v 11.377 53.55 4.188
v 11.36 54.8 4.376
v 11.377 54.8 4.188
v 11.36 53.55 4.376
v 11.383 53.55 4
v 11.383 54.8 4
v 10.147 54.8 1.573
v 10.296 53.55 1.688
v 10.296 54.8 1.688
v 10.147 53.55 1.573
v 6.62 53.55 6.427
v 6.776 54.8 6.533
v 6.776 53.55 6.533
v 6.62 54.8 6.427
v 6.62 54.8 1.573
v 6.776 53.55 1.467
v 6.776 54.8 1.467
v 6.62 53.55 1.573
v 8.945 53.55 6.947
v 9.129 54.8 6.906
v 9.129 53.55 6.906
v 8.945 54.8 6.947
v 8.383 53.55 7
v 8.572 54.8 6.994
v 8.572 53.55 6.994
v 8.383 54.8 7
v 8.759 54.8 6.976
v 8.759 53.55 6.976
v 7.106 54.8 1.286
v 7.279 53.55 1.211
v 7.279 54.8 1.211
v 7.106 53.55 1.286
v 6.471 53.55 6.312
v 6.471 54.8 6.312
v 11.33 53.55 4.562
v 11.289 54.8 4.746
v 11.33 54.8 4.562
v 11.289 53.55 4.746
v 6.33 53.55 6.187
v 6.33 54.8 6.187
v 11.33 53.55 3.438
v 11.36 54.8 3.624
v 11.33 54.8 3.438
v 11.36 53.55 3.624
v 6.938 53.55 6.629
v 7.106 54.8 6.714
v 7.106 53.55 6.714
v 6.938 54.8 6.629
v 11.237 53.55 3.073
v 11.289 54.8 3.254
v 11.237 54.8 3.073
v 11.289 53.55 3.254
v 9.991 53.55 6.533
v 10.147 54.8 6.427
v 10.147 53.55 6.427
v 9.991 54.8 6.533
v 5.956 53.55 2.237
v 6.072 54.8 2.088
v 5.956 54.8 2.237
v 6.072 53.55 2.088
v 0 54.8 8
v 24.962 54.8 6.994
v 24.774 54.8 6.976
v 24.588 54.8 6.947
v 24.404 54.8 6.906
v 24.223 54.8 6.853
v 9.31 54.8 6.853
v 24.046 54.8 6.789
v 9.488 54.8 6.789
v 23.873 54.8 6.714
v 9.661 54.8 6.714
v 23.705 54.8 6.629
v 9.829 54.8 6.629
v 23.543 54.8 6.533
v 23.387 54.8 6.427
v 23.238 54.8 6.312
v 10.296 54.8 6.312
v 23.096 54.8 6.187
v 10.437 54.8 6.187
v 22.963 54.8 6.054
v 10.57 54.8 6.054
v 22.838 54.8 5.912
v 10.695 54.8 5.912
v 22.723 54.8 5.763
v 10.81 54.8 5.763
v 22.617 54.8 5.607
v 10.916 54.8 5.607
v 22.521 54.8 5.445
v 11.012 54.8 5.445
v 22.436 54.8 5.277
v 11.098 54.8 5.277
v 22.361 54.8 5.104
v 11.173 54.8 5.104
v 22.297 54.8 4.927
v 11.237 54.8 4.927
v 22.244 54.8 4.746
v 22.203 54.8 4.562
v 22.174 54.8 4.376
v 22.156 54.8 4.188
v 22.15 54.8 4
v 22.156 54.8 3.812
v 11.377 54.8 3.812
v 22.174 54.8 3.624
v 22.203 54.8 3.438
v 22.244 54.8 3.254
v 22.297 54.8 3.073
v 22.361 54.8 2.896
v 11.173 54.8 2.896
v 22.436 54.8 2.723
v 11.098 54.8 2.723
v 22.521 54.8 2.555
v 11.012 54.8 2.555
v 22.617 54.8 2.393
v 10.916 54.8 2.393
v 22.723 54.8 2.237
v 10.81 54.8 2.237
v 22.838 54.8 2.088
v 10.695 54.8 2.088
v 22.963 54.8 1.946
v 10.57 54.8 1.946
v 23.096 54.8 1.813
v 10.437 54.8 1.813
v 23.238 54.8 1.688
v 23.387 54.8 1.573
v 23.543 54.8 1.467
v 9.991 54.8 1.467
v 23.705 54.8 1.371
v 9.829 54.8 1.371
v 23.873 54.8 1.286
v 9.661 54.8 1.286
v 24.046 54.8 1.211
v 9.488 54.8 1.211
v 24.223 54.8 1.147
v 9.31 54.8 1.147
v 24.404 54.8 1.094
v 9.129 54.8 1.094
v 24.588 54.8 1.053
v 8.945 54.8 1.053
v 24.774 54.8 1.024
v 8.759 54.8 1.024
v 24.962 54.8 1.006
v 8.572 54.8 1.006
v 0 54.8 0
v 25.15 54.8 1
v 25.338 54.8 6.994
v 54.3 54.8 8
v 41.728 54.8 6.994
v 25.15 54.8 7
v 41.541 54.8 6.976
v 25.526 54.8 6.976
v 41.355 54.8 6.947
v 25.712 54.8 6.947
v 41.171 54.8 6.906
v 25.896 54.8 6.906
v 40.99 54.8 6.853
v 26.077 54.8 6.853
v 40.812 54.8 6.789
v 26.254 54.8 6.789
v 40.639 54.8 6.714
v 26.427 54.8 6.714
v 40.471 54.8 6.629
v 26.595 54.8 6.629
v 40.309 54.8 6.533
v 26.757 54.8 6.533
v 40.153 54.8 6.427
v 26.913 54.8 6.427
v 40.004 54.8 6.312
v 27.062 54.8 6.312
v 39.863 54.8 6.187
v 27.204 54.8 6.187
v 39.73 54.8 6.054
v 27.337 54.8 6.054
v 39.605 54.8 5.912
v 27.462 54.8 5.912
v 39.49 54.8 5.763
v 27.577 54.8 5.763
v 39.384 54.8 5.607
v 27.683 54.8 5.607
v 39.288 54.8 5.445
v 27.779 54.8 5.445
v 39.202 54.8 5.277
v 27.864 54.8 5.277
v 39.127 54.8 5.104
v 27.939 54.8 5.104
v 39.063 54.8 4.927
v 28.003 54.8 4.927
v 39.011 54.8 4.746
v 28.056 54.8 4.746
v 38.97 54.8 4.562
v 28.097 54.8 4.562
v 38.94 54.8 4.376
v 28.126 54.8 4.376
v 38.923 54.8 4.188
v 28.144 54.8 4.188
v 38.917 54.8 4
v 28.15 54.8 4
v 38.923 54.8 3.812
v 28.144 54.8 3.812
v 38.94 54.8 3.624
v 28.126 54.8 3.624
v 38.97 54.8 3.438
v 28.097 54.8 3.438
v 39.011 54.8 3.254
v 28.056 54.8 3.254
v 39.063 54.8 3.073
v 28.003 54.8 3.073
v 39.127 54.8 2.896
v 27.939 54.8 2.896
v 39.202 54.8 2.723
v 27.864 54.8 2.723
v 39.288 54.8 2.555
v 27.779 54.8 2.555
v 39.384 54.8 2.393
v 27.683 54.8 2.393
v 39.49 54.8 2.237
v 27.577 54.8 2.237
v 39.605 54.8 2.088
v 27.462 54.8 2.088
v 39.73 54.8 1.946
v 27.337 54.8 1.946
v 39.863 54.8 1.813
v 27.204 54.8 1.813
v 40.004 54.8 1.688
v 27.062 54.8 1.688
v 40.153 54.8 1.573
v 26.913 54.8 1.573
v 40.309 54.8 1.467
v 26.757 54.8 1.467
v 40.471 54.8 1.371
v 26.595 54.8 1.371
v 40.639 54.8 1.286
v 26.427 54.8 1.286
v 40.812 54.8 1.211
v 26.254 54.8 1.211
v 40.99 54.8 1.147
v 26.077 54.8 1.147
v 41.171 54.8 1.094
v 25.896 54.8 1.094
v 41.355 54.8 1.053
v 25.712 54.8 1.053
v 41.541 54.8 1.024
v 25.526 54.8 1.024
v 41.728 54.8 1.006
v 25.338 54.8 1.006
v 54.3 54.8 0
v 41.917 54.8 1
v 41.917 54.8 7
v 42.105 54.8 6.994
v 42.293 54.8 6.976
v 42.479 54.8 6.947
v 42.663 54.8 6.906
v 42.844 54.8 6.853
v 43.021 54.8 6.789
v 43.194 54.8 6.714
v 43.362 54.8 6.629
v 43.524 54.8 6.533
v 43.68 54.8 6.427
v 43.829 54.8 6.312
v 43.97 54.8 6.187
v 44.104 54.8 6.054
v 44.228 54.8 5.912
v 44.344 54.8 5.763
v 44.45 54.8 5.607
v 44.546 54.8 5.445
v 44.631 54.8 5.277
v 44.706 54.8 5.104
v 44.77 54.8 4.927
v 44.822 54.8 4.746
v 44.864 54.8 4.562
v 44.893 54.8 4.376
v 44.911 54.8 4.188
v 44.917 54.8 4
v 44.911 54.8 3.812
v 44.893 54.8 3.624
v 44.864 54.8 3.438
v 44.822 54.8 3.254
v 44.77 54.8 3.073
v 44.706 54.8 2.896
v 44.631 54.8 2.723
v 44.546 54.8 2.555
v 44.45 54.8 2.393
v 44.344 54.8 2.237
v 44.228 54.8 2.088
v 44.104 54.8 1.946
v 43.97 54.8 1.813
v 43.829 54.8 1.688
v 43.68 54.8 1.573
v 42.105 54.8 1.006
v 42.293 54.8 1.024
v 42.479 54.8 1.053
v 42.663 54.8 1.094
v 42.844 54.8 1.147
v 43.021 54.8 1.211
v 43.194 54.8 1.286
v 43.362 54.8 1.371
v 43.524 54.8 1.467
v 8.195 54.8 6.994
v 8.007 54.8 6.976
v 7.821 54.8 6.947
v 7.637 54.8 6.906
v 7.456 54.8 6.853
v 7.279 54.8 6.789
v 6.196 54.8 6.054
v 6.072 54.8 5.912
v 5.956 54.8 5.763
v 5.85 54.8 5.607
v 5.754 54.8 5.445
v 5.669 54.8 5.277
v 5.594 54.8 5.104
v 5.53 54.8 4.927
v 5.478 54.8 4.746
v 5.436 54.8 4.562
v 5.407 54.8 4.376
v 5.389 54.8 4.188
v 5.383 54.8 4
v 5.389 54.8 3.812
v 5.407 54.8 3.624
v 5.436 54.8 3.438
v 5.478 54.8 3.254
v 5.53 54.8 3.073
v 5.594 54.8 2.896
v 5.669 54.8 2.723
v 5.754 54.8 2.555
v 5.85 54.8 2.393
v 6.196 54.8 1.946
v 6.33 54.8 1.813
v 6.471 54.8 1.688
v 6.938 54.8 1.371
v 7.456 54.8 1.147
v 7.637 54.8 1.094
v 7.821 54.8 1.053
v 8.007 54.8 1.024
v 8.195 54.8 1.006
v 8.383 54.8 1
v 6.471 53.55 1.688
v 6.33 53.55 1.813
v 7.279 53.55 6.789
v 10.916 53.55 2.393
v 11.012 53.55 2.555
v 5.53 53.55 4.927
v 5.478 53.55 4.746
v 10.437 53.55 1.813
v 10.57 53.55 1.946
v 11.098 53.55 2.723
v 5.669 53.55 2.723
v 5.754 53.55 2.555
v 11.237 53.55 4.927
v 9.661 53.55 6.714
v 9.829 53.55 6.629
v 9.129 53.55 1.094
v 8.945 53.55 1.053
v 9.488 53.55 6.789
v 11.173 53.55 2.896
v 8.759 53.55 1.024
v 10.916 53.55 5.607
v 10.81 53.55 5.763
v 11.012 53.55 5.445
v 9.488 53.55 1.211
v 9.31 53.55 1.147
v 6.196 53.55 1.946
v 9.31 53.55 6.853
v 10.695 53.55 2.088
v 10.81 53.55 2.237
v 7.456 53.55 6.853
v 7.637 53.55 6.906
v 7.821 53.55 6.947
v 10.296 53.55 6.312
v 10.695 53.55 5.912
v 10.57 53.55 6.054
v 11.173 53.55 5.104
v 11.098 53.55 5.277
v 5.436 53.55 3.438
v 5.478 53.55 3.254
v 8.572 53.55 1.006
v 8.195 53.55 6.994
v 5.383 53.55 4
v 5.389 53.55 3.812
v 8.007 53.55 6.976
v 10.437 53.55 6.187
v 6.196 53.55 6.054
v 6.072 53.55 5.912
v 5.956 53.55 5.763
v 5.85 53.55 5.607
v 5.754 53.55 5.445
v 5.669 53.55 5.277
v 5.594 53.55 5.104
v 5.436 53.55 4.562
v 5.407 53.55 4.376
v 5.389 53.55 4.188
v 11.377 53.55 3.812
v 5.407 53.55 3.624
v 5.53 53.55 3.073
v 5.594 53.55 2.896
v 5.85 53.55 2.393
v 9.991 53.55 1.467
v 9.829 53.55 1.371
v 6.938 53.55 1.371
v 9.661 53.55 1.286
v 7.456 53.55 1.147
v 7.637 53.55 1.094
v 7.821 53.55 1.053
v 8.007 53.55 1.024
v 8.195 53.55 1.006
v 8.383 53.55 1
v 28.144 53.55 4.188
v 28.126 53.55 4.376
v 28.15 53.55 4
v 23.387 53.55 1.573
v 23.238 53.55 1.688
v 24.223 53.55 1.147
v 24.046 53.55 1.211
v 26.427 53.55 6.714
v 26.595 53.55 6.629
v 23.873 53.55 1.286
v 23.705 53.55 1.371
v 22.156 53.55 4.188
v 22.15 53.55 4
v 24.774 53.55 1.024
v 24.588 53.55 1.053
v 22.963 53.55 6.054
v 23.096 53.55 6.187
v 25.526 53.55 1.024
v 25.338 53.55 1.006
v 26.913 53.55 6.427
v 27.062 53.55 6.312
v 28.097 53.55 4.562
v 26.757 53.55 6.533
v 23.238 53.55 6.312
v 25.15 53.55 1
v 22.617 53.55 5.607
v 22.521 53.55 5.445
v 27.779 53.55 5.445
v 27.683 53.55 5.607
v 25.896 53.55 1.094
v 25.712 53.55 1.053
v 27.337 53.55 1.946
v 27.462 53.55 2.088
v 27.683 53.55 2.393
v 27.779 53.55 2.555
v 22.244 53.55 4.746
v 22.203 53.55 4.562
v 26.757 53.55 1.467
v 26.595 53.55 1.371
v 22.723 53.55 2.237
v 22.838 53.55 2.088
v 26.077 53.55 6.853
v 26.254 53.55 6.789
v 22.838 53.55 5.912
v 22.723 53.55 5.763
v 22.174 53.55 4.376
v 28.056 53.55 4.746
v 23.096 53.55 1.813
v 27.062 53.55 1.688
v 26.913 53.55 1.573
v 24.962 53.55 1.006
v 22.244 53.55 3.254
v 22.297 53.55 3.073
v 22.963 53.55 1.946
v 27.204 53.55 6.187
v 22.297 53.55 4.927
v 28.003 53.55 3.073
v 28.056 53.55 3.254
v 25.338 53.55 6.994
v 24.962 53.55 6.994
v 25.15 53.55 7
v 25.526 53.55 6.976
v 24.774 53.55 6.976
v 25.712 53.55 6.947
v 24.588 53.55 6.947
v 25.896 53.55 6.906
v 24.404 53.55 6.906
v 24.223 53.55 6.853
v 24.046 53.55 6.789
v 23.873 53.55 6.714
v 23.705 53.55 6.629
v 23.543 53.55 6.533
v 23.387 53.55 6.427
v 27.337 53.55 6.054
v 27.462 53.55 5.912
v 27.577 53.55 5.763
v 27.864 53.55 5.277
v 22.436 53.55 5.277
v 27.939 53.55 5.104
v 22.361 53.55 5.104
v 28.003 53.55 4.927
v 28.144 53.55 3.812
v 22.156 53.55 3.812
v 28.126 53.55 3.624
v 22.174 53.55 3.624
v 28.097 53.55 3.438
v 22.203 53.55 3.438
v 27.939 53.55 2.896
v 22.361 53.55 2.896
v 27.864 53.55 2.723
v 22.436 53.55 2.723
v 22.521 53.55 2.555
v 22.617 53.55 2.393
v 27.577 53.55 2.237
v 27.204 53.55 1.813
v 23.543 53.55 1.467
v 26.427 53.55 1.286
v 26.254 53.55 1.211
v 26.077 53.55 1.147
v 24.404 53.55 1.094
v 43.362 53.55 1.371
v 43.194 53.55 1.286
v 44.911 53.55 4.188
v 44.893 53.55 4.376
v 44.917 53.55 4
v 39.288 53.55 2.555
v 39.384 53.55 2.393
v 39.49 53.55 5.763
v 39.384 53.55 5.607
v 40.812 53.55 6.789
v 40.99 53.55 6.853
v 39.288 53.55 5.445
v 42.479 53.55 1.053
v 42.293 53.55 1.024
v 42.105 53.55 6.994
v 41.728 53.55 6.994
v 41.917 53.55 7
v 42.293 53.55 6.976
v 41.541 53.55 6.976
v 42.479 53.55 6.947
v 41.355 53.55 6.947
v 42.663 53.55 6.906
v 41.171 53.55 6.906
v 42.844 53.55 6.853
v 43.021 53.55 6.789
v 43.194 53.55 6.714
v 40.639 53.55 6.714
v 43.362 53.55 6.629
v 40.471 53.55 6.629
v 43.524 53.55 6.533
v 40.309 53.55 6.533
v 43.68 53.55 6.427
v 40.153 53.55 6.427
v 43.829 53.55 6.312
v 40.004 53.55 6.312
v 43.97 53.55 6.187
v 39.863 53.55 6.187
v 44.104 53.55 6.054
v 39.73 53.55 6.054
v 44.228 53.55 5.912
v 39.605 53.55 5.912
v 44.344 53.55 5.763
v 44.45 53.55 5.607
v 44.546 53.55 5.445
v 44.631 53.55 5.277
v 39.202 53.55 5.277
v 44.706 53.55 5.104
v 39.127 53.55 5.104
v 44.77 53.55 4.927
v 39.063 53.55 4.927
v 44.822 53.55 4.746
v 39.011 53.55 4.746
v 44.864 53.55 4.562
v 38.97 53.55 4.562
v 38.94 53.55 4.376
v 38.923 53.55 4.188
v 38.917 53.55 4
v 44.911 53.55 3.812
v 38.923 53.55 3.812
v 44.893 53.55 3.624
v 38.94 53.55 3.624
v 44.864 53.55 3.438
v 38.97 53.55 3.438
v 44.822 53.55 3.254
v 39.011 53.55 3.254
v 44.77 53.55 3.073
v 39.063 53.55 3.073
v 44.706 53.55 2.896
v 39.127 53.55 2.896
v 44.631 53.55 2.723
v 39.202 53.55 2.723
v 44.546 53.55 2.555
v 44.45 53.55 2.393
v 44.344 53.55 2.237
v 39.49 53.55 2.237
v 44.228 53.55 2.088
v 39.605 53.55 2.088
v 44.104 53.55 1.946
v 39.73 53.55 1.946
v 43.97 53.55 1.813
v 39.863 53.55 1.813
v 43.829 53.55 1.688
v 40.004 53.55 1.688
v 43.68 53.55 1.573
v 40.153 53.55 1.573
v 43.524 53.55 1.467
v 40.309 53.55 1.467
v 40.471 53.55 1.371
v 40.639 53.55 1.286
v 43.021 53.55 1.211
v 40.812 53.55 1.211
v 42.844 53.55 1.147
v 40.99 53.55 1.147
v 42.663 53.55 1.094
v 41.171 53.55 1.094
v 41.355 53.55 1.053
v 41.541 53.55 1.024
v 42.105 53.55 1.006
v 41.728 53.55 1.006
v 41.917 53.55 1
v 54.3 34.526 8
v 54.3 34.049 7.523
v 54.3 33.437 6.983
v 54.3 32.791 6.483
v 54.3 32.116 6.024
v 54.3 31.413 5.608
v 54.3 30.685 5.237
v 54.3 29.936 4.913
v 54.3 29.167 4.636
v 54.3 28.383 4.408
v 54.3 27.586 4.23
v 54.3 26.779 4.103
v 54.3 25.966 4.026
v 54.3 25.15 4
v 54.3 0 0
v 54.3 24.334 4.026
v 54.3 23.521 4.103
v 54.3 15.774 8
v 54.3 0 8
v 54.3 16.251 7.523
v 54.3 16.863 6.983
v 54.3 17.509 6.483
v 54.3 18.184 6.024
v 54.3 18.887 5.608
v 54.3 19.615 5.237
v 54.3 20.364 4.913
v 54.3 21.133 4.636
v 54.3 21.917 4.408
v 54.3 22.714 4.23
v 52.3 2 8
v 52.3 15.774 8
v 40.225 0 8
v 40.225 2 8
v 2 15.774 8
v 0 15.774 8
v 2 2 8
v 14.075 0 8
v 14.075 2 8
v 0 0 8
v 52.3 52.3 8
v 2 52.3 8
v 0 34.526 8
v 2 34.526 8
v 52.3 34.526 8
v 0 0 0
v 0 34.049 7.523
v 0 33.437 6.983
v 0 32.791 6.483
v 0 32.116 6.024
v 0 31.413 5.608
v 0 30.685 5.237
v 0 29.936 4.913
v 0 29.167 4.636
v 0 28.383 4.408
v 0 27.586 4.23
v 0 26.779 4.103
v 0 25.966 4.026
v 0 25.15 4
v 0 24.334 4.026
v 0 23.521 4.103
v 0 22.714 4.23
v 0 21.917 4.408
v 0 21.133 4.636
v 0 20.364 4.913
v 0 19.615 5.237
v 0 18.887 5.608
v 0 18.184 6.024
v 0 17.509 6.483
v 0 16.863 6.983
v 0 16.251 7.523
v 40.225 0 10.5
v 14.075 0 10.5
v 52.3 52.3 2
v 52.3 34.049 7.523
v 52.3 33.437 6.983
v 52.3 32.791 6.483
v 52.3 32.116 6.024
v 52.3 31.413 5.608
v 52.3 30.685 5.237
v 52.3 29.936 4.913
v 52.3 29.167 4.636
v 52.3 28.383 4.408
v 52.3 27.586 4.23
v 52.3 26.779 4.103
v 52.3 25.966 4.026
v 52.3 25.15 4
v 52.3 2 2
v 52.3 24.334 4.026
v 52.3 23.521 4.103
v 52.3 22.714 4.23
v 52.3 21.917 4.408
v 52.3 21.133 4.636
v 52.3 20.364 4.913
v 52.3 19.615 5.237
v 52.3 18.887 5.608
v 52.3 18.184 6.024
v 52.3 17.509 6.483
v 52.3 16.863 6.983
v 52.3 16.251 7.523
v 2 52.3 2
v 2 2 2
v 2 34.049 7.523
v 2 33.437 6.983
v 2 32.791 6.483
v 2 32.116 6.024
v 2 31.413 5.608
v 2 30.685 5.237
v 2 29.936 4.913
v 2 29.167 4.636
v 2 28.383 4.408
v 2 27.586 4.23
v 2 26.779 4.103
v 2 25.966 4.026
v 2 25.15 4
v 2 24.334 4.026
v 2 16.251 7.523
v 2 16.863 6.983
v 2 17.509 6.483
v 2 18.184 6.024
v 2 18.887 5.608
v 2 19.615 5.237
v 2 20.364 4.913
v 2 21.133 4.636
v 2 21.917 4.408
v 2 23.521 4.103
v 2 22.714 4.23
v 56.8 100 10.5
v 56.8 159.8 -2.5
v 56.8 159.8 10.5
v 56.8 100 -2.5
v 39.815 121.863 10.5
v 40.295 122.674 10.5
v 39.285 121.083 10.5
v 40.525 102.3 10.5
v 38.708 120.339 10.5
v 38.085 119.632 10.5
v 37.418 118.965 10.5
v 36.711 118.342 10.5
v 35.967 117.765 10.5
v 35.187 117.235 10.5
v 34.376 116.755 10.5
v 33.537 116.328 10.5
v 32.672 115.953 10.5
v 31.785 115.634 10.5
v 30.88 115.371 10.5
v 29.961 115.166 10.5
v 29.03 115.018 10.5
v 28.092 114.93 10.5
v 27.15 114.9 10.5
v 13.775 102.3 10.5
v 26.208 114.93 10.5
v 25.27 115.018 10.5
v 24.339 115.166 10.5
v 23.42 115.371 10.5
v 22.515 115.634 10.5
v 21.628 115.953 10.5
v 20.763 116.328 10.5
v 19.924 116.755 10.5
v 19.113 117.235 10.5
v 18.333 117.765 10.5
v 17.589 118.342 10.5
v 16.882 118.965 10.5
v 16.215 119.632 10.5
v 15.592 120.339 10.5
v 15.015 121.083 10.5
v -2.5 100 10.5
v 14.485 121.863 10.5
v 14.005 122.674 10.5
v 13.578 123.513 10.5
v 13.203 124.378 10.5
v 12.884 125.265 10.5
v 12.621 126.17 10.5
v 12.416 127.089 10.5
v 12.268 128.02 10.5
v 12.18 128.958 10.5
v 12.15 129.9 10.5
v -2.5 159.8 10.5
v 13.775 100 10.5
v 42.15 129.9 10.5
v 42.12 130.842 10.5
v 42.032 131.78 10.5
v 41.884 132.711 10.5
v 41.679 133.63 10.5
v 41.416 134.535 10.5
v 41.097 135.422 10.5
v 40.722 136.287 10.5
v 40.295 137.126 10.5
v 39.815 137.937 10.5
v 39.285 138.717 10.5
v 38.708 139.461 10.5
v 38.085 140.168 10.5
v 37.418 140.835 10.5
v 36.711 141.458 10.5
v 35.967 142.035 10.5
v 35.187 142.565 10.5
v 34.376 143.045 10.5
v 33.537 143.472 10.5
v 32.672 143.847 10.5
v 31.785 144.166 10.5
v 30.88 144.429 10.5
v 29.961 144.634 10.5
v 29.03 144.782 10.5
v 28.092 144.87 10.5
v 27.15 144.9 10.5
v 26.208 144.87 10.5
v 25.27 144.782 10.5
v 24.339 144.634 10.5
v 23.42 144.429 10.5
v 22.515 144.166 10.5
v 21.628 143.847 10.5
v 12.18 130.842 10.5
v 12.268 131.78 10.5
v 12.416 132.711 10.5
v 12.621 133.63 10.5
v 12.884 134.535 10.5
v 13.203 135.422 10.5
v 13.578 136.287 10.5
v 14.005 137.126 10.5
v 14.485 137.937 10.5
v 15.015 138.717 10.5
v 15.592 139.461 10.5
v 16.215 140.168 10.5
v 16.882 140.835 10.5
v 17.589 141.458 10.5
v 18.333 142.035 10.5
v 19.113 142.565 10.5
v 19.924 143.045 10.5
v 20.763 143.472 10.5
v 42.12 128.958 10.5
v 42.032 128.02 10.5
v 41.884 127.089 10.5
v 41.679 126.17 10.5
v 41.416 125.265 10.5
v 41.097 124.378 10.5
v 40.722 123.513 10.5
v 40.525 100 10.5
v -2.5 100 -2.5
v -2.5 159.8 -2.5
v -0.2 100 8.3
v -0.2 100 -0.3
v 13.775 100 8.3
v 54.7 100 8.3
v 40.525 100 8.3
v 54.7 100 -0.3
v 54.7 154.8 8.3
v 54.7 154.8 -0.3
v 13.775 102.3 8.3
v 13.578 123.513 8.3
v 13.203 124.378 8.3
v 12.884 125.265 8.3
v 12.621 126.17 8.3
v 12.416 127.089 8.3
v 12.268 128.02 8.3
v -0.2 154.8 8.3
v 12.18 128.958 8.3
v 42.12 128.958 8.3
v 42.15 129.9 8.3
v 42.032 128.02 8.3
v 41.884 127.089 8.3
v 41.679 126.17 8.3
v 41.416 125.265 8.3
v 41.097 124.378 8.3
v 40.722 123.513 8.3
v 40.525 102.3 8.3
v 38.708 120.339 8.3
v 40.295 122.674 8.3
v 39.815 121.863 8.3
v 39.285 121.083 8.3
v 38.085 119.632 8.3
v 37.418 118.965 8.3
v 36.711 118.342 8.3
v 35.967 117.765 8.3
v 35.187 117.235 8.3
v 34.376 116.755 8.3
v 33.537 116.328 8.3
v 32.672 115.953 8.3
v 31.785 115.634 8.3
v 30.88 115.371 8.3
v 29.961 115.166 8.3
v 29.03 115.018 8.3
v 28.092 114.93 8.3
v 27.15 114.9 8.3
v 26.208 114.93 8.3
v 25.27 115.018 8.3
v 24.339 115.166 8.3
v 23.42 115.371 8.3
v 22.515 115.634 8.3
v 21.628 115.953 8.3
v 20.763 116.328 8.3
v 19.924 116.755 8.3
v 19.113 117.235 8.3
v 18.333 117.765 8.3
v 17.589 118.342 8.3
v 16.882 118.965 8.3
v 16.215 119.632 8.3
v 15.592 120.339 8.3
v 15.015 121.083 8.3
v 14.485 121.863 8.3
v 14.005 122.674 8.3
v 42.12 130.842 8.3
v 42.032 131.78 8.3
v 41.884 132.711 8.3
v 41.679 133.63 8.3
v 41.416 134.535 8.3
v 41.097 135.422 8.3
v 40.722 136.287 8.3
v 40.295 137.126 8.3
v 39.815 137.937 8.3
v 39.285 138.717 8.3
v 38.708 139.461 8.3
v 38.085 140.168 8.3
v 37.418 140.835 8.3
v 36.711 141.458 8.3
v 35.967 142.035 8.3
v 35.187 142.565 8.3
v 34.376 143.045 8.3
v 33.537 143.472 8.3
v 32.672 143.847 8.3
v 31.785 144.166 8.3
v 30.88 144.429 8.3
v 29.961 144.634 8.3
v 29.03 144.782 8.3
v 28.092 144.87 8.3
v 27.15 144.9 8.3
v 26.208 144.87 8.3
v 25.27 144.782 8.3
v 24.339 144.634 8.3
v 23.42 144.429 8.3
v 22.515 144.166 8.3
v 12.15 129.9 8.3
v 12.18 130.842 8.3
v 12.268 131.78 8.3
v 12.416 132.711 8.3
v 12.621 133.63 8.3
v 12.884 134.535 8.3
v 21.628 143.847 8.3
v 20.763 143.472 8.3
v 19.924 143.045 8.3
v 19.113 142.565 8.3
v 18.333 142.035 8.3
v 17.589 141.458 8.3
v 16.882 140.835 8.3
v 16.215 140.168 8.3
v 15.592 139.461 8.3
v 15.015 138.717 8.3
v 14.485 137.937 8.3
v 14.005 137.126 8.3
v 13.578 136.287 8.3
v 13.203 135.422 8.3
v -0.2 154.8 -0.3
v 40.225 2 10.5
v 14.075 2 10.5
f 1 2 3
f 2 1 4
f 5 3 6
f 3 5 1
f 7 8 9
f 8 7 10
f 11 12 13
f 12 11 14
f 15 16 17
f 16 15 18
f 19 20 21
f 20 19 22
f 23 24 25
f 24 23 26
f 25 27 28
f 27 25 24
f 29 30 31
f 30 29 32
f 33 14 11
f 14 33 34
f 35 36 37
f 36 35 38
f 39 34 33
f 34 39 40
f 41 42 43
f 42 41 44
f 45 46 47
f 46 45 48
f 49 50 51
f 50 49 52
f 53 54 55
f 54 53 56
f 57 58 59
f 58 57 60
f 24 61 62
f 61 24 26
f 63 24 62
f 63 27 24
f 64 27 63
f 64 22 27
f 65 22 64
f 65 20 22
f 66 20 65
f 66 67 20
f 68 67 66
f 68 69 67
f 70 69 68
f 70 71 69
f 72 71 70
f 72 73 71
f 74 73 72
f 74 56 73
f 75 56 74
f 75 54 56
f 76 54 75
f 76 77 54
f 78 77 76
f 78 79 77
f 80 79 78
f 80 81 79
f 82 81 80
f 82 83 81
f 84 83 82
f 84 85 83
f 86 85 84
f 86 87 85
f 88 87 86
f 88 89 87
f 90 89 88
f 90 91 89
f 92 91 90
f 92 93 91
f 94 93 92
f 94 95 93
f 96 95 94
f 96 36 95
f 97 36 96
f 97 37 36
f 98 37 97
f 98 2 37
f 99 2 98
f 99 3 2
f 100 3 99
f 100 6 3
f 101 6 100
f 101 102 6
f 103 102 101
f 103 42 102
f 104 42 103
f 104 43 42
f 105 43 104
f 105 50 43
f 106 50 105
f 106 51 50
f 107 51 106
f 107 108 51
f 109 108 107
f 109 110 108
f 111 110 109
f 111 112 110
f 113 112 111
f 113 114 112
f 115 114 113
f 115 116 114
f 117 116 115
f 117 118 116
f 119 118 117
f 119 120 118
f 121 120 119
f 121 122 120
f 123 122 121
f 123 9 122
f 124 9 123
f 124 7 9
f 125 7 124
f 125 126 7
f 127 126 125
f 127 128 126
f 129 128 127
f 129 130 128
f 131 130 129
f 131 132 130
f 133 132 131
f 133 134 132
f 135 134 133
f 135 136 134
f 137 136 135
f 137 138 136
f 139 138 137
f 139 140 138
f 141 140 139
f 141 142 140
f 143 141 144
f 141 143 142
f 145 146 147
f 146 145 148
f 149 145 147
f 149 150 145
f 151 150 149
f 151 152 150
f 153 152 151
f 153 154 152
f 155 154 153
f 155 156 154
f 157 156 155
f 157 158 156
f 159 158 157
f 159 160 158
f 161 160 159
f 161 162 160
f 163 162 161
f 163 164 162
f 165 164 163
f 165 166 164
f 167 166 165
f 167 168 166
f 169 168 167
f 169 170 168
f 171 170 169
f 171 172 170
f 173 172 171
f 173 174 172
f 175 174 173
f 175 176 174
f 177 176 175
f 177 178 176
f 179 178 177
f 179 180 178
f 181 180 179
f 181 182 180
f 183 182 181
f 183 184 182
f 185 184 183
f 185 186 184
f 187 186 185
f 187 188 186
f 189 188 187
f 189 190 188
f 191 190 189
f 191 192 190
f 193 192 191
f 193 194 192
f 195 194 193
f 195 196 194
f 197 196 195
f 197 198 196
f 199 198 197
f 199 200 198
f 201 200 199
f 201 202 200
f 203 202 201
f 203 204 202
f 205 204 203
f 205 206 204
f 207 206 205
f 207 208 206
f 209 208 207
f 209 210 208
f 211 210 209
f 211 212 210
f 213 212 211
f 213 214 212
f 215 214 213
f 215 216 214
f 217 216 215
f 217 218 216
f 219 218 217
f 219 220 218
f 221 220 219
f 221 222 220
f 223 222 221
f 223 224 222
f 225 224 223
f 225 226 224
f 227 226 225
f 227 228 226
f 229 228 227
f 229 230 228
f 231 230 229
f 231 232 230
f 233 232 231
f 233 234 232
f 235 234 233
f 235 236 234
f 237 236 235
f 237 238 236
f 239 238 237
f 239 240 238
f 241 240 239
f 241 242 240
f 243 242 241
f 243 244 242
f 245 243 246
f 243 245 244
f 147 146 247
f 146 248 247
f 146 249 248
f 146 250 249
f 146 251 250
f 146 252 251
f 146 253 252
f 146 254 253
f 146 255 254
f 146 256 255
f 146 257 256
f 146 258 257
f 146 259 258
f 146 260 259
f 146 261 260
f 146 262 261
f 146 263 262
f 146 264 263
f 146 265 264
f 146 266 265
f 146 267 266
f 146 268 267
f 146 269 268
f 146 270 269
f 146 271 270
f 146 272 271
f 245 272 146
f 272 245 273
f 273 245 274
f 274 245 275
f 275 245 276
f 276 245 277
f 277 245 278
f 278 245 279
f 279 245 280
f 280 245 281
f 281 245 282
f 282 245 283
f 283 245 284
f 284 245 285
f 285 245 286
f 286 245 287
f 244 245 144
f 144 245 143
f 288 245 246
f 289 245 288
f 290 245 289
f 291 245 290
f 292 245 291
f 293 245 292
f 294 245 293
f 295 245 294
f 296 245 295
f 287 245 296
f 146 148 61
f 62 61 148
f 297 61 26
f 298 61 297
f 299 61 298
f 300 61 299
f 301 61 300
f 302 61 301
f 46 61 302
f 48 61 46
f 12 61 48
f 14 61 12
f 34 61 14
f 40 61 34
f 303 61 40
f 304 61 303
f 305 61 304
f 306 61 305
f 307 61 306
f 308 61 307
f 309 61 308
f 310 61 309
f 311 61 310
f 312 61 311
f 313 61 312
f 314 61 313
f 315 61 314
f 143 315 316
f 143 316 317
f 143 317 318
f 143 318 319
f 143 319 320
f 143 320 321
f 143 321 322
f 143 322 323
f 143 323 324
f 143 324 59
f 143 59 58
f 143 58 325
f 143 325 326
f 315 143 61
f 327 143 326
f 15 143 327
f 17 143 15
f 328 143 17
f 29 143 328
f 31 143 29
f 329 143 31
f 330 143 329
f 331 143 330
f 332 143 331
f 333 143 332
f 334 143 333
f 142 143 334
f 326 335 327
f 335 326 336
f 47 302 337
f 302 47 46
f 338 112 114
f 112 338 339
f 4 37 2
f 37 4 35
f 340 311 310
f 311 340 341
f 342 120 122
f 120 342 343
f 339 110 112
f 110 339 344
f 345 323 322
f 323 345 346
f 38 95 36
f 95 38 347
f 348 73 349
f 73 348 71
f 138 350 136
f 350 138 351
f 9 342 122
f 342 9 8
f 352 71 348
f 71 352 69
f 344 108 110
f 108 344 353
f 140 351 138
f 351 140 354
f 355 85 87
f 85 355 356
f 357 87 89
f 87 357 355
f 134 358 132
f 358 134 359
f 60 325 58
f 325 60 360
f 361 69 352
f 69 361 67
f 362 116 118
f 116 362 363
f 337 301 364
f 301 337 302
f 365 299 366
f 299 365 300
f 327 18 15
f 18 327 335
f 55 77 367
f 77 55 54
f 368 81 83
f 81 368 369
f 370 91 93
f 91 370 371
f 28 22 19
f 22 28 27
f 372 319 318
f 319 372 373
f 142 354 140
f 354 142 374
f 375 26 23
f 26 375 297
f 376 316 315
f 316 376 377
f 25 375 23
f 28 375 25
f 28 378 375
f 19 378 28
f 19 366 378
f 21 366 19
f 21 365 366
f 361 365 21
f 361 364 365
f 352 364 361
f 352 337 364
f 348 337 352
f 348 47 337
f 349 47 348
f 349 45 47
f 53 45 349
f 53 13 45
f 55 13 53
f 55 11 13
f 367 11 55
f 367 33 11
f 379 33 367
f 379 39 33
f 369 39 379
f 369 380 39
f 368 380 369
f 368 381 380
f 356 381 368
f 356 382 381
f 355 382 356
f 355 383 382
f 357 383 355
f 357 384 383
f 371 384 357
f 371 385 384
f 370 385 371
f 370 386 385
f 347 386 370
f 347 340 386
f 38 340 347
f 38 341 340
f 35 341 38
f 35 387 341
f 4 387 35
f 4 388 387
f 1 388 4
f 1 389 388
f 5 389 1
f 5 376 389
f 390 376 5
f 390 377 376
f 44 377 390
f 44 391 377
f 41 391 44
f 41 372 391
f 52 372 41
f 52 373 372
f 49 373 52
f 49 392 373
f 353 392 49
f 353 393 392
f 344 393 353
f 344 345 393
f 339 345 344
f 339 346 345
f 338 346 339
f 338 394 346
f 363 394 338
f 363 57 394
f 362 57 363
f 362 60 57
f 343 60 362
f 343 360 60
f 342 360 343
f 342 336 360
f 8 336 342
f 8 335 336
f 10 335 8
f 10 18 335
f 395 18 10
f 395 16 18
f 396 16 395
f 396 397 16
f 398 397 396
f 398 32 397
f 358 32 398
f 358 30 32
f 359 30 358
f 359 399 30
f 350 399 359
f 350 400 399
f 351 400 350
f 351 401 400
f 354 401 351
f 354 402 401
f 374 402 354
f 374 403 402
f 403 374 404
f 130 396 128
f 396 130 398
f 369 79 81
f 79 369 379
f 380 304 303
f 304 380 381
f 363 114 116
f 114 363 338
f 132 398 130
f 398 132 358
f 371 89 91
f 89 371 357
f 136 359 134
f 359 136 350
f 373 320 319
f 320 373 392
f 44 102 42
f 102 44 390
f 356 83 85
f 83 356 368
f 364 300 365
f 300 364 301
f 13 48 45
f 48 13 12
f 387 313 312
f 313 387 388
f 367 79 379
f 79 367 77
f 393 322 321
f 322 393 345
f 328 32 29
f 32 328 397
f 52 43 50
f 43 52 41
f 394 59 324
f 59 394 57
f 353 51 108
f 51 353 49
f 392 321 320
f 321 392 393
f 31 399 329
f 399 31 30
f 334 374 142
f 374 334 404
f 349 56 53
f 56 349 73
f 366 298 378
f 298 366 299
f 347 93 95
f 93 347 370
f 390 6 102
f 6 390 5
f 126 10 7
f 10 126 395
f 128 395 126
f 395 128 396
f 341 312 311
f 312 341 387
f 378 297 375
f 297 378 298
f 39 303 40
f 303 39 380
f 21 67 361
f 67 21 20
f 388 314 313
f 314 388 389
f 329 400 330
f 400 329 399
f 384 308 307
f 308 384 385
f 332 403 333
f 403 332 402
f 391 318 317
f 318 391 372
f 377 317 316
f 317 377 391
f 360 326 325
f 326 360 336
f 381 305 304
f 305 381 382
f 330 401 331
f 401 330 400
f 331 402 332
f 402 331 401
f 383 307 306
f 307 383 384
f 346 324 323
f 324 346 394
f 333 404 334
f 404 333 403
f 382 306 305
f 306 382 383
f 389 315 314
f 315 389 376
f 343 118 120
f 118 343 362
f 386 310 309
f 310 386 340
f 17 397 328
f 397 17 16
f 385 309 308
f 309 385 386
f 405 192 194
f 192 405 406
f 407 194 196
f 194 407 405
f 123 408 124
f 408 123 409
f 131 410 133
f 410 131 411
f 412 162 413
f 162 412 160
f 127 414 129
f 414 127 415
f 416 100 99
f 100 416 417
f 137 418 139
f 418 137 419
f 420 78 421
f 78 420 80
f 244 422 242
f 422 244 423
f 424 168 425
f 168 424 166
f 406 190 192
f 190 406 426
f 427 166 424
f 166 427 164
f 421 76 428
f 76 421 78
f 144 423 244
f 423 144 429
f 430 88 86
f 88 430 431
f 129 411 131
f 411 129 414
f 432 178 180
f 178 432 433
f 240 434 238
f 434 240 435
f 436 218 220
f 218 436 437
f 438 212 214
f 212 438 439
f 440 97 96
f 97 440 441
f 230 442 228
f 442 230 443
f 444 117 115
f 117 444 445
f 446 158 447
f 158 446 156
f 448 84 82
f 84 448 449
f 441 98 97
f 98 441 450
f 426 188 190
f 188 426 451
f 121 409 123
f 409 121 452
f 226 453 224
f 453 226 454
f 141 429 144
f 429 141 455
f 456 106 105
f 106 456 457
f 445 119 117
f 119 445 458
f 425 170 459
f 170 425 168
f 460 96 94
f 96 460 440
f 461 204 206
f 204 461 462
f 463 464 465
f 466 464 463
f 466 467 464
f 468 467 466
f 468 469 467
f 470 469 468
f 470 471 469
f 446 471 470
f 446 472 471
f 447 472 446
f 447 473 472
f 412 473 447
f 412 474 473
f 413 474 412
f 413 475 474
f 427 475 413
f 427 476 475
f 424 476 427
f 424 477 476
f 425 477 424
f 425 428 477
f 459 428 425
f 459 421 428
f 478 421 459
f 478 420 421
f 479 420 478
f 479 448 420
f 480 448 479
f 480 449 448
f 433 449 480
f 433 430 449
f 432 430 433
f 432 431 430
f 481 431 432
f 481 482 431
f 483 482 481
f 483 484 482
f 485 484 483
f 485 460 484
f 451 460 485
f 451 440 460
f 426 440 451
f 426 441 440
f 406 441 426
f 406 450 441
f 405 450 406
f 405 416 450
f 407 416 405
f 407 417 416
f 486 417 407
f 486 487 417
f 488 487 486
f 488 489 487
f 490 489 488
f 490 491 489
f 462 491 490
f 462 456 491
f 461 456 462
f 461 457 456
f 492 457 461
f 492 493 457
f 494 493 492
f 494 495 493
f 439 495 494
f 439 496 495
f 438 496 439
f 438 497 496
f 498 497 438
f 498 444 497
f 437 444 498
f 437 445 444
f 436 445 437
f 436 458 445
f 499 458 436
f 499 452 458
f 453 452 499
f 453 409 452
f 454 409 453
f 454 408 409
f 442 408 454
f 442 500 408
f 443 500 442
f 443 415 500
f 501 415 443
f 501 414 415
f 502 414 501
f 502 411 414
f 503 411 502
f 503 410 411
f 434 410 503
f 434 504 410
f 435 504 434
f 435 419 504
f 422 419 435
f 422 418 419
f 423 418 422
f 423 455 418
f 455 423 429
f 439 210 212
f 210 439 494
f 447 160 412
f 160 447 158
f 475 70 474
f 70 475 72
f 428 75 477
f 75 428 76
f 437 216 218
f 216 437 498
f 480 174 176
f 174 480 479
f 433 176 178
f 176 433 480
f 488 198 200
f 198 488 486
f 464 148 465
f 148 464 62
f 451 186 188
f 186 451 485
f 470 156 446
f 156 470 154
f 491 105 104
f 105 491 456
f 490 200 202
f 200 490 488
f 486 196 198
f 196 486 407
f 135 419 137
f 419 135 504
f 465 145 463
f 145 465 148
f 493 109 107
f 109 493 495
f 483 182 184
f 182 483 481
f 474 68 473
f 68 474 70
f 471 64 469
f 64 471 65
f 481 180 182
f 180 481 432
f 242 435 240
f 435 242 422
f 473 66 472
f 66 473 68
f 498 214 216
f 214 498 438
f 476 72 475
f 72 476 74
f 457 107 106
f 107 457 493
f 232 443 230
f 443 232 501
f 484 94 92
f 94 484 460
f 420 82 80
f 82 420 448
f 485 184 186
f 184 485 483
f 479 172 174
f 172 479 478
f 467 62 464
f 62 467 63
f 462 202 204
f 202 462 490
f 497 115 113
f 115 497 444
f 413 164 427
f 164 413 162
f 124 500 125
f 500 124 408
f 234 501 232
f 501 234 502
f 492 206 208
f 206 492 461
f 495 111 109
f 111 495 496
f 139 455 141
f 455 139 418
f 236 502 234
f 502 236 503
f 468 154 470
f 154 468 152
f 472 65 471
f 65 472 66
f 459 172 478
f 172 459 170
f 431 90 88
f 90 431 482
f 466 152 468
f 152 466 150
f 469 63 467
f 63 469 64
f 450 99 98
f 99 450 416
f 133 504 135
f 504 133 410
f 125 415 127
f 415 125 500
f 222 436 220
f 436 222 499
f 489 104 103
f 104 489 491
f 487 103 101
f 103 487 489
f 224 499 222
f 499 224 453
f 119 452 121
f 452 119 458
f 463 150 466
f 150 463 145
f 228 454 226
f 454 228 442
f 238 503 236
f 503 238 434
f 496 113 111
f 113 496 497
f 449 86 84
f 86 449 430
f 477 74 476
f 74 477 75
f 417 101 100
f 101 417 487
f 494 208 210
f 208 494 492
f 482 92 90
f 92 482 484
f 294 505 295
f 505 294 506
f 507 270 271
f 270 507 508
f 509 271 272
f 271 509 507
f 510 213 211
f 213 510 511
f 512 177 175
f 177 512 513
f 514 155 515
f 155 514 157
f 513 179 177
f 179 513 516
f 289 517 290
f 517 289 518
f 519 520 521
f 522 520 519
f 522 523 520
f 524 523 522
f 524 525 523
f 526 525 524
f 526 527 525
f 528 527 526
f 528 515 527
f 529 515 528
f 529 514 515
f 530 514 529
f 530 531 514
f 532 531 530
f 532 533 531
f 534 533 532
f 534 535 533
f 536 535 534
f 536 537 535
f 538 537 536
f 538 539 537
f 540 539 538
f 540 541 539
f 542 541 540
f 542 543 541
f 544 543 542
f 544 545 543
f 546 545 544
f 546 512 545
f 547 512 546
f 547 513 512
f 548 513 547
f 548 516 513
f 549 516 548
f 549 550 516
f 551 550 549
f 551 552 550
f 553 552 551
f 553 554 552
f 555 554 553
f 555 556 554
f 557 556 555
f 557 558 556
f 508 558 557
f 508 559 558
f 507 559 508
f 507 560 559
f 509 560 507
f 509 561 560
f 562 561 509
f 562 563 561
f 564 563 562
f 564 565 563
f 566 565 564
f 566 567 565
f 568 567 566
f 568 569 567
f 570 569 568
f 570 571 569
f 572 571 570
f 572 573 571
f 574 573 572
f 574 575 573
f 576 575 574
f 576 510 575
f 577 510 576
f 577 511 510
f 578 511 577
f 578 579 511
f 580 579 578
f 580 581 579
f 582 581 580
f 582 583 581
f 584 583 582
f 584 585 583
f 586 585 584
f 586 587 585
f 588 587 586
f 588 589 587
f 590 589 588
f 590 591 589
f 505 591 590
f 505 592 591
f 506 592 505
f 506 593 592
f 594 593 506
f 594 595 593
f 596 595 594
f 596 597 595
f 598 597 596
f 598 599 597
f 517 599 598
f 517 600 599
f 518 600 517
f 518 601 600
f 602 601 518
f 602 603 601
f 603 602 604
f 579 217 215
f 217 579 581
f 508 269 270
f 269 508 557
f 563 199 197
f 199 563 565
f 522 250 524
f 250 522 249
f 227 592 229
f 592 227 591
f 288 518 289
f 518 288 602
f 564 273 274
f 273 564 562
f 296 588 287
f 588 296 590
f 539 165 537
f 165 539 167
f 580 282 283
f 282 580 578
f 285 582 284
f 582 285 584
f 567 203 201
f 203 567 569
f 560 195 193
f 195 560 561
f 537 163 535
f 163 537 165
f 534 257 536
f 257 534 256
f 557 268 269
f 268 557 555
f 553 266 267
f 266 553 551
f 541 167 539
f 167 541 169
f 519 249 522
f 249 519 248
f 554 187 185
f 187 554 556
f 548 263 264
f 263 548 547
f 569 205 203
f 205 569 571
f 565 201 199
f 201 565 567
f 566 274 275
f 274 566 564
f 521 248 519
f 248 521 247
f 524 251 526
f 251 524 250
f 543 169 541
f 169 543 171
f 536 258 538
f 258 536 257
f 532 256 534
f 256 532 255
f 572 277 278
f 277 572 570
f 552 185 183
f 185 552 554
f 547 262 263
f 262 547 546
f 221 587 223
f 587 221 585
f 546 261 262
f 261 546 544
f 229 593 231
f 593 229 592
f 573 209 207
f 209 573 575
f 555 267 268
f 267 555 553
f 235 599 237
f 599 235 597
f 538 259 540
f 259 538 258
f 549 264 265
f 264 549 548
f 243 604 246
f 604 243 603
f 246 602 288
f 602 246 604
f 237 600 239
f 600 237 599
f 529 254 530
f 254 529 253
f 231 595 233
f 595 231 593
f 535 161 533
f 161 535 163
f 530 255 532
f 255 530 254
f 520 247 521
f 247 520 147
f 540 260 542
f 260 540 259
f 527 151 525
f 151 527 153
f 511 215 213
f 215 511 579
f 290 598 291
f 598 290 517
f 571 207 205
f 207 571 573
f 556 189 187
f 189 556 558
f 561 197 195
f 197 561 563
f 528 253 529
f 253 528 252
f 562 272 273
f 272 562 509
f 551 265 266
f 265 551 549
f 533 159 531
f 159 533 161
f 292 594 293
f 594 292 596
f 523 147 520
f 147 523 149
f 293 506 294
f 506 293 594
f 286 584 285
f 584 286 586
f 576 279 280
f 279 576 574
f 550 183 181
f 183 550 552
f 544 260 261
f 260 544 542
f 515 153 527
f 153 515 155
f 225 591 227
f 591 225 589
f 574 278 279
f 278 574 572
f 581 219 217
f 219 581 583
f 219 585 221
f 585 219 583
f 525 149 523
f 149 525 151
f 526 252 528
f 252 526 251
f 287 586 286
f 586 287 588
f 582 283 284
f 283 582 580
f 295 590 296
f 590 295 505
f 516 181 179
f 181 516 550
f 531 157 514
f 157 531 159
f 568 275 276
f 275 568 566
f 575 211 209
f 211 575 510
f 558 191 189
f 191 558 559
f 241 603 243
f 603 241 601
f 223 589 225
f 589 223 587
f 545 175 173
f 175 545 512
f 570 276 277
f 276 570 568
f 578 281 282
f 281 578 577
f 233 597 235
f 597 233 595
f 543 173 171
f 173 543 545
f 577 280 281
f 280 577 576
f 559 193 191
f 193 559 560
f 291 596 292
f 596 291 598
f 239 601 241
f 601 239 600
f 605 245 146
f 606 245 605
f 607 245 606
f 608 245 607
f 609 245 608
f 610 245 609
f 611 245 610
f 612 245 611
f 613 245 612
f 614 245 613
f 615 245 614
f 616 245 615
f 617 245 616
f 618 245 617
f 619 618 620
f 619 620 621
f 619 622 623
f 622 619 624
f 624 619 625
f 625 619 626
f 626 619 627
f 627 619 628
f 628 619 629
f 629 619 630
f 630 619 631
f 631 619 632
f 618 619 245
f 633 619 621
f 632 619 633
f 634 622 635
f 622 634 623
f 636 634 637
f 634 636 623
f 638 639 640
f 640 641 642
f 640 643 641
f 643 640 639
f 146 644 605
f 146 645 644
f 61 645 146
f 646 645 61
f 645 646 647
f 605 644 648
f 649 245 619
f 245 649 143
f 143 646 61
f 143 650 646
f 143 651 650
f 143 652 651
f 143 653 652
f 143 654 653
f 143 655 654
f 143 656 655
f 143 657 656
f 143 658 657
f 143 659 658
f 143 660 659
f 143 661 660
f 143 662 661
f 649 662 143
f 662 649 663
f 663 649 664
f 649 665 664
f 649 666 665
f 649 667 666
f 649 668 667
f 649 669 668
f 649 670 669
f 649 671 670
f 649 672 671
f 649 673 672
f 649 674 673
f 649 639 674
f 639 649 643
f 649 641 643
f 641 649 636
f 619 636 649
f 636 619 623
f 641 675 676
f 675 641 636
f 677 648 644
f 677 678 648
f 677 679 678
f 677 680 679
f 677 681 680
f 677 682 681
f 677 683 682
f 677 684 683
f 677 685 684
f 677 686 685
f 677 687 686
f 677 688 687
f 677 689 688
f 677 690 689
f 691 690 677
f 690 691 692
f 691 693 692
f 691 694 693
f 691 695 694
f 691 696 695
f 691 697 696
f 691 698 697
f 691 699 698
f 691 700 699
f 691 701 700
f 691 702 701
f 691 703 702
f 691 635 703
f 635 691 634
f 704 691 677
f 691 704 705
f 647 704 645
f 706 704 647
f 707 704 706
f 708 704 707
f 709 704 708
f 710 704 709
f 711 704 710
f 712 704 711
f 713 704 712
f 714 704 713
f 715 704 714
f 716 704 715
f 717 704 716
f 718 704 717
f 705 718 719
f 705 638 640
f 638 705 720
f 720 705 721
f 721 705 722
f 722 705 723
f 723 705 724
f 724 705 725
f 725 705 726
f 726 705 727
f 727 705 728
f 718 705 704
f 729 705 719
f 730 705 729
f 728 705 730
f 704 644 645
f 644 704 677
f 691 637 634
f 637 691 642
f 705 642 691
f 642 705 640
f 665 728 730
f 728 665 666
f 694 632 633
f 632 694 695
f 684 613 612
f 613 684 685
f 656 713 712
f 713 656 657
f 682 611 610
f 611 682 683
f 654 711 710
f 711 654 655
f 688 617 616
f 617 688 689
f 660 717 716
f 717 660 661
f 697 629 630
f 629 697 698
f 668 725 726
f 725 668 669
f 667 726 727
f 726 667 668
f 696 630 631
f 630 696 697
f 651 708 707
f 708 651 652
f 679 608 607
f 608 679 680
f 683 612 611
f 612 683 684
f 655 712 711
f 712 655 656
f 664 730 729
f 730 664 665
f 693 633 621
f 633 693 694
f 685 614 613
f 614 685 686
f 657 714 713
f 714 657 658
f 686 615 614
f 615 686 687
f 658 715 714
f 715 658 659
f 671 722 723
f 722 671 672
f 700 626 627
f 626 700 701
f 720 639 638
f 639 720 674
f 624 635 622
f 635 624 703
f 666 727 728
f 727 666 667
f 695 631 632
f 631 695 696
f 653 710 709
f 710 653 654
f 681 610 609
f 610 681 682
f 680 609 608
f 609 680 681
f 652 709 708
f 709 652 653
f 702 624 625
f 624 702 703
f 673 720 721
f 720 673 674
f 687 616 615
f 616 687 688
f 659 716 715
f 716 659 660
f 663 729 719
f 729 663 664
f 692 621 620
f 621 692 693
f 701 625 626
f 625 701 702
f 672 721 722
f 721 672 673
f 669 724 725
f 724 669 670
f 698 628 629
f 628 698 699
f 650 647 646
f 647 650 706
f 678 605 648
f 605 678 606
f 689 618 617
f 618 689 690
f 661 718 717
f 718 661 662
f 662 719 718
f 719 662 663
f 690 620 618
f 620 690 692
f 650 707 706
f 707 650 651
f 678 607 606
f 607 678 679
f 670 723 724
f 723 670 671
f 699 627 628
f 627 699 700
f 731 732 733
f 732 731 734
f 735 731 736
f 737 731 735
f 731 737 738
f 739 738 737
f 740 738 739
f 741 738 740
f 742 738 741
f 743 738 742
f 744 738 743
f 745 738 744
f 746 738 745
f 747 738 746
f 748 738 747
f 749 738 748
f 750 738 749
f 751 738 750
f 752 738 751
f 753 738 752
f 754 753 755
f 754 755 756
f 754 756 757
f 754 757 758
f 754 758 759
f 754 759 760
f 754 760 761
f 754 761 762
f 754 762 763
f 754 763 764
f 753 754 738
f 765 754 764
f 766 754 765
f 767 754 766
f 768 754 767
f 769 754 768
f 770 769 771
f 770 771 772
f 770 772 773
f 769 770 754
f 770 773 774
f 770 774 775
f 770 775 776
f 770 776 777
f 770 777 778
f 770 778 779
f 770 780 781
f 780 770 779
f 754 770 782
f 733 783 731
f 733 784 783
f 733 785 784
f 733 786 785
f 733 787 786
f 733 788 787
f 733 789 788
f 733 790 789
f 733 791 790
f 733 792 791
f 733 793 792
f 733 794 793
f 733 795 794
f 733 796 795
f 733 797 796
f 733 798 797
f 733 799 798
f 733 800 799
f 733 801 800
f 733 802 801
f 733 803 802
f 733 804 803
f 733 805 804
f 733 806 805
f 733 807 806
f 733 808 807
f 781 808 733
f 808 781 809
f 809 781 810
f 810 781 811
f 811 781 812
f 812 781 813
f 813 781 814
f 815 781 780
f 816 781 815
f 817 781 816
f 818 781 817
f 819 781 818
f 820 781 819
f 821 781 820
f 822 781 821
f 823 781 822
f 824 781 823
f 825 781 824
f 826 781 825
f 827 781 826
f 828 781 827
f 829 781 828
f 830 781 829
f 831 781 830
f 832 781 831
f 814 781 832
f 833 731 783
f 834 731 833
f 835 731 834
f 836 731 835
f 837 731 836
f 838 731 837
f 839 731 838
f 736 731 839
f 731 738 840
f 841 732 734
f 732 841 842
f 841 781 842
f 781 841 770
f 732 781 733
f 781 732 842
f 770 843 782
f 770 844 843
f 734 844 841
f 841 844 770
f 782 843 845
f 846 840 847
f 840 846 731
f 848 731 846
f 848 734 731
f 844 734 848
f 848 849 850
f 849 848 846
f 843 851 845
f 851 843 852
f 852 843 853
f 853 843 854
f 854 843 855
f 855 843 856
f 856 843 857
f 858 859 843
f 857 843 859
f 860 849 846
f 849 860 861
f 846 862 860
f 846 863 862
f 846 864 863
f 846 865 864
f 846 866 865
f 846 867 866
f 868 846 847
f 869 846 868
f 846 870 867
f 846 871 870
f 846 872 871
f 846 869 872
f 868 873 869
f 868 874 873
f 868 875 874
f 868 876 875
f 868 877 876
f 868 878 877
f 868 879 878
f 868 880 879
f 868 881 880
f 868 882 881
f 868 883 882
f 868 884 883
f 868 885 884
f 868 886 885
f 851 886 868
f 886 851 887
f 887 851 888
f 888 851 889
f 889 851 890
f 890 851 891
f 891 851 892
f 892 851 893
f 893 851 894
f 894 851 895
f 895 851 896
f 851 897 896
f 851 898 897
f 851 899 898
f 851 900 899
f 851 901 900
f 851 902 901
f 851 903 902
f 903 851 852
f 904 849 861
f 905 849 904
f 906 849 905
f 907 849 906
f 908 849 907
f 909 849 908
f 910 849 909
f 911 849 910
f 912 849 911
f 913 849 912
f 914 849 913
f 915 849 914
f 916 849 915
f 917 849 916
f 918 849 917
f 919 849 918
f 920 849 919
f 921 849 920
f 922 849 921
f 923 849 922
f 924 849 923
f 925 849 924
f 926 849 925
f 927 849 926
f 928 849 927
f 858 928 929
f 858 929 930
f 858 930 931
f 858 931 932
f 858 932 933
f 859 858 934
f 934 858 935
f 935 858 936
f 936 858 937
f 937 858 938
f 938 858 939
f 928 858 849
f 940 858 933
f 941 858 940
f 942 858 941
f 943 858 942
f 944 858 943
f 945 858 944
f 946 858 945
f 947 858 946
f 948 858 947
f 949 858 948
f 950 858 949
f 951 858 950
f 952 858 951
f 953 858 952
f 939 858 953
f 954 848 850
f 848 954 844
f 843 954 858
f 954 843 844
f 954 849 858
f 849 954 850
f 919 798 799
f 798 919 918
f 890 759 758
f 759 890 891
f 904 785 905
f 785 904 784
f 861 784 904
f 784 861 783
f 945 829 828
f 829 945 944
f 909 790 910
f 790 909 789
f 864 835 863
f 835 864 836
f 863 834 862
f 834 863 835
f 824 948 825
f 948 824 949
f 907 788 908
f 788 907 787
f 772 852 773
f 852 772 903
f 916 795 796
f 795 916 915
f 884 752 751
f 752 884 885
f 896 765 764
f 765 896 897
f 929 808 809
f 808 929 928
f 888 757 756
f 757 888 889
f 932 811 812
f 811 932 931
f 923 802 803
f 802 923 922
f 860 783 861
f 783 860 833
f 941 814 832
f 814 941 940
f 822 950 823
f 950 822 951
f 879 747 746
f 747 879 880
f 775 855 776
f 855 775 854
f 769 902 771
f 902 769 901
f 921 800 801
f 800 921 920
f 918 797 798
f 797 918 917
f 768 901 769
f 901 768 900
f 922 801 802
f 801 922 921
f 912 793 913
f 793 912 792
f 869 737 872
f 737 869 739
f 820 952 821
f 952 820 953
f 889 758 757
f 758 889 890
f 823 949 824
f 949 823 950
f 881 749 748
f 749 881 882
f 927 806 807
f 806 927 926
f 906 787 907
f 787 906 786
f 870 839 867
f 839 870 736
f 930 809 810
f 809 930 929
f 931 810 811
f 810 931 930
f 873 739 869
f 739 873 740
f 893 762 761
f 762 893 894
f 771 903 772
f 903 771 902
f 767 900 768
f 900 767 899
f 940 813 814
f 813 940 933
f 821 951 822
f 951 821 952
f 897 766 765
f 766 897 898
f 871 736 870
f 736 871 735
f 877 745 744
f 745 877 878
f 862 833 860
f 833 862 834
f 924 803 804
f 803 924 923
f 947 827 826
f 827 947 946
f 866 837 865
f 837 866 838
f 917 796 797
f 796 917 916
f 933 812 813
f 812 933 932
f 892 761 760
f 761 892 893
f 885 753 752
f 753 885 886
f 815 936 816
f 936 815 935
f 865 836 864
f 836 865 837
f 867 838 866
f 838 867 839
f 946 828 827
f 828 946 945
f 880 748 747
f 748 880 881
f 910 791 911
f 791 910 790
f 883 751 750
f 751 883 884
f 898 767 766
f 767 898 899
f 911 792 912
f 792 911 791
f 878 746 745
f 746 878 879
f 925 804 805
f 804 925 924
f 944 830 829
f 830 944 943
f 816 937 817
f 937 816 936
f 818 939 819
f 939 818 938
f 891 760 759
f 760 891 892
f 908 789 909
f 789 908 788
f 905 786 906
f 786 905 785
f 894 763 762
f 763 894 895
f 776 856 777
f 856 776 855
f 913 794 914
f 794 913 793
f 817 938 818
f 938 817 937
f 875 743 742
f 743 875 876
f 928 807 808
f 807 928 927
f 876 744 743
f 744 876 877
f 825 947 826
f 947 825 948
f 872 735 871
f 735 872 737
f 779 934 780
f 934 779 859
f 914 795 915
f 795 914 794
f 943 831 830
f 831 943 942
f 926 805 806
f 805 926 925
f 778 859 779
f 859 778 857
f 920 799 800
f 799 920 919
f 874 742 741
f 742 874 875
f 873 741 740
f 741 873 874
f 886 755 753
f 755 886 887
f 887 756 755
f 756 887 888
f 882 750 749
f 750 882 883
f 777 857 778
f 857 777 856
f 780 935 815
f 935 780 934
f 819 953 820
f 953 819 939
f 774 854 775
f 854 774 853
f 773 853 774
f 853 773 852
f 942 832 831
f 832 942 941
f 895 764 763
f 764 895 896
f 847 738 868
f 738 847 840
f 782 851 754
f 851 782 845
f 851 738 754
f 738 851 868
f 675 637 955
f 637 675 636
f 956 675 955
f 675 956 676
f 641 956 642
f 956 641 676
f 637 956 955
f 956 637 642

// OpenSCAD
$fn=100;

CPU_LENGTH_SOCKET = 50;
CPU_WIDTH_SOCKET = 50;
CPU_EXTRA_GAP = 0.30;
CPU_LENGTH = CPU_LENGTH_SOCKET + CPU_EXTRA_GAP; // X
CPU_WIDTH = CPU_WIDTH_SOCKET + CPU_EXTRA_GAP; // Y
CPU_HEIGHT = 5; // Z
CPU_ADDITIONAL_HEIGHT = 3;
BASE_HEIGHT = 2;
WALL_SIDE_HEIGHT = 2;
WALL_BACK_HEIGHT = 2.5;
WALL_PICK_LENGTH = (CPU_LENGTH/2)+1;
WALL_PICK_HEIGHT = 1.5;
NUM_CILIDENRS_CUT = 3;

BOX_WALL_HEIGHT = WALL_BACK_HEIGHT;
BOX_WALL_EXTRA_GAP = 0.30;

cpu_total_length = CPU_LENGTH + (2 * WALL_SIDE_HEIGHT);
cpu_total_width = CPU_WIDTH + (WALL_SIDE_HEIGHT + WALL_BACK_HEIGHT);
cpu_height = CPU_HEIGHT + CPU_ADDITIONAL_HEIGHT;

// Box
difference() {
    cube([cpu_total_length, cpu_total_width, cpu_height]);
    // Cube cut that give the box form
    translate([WALL_SIDE_HEIGHT, WALL_SIDE_HEIGHT, BASE_HEIGHT]){
        cube([CPU_LENGTH, CPU_WIDTH, 40]);
    }
    // Cilinder cut on side to better grip
    translate([0, CPU_WIDTH/2, CPU_HEIGHT+BASE_HEIGHT+10]){
        rotate([90, 0, 90]){
            cylinder(cpu_total_length, 13, 13);
        }
    }
    // Cilinder cuts on back
    for ( i = [0 : NUM_CILIDENRS_CUT - 1] ){
        translate([(CPU_LENGTH/NUM_CILIDENRS_CUT*i) + (CPU_LENGTH/NUM_CILIDENRS_CUT/2), cpu_total_width, (CPU_HEIGHT + CPU_ADDITIONAL_HEIGHT) / 2]){
            rotate([90, 0, 0]){
                cylinder(WALL_BACK_HEIGHT/2, 3, 3);
            }
        }
    }
}
// Box Tap
translate([(cpu_total_length - WALL_PICK_LENGTH) / 2, 0, CPU_HEIGHT + CPU_ADDITIONAL_HEIGHT]){
    cube([WALL_PICK_LENGTH , WALL_SIDE_HEIGHT, WALL_BACK_HEIGHT]);
}

// ---

UI_TEMP_MOVE = 100;

box_total_length = cpu_total_length + (2 * BOX_WALL_HEIGHT);
box_total_width = cpu_total_width + (2 * BOX_WALL_HEIGHT);
box_total_height = cpu_height + (2 * BOX_WALL_HEIGHT);

// Box Enclosure
translate([-WALL_BACK_HEIGHT, UI_TEMP_MOVE, -WALL_BACK_HEIGHT]){
    difference() {
        cube([box_total_length, box_total_width, box_total_height]);
        // Cube cut to give the box enclosure the form
        translate([
            WALL_SIDE_HEIGHT + BOX_WALL_EXTRA_GAP,
            0, 
            BOX_WALL_HEIGHT - BOX_WALL_EXTRA_GAP
        ]){
            cube([
                cpu_total_length + (2 * BOX_WALL_EXTRA_GAP),
                cpu_total_width,
                cpu_height + (2 * BOX_WALL_EXTRA_GAP)
            ]);
        }
        // Cilinder cut in top middle of enclosure
        translate([
            box_total_length/2,
            box_total_width/2, 
            BOX_WALL_HEIGHT + cpu_height
        ]){
            cylinder(BOX_WALL_HEIGHT, 15, 15);
        }
        // Cube cut for box tap
        BOX_ENCLOSURE_BOX_TAP_TRANSLATE_X = (box_total_length / 2) - ((WALL_PICK_LENGTH + (BOX_WALL_EXTRA_GAP*2)) / 2);
        BOX_ENCLOSURE_BOX_TAP_TRANSLATE_Y = 0;
        BOX_ENCLOSURE_BOX_TAP_TRANSLATE_Z = BOX_WALL_HEIGHT + cpu_height;
        BOX_ENCLOSURE_BOX_TAP_CUBE_LENGTH = (WALL_PICK_LENGTH + (BOX_WALL_EXTRA_GAP*2));
        BOX_ENCLOSURE_BOX_TAP_CUBE_WIDTH = WALL_SIDE_HEIGHT +BOX_WALL_EXTRA_GAP;
        BOX_ENCLOSURE_BOX_TAP_CUBE_HEIGHT = BOX_WALL_HEIGHT;
        translate([
            BOX_ENCLOSURE_BOX_TAP_TRANSLATE_X, 
            BOX_ENCLOSURE_BOX_TAP_TRANSLATE_Y, 
            BOX_ENCLOSURE_BOX_TAP_TRANSLATE_Z
        ]){
            cube([
                BOX_ENCLOSURE_BOX_TAP_CUBE_LENGTH, 
                BOX_ENCLOSURE_BOX_TAP_CUBE_WIDTH, 
                BOX_ENCLOSURE_BOX_TAP_CUBE_HEIGHT
            ]);
        }
    }
}
